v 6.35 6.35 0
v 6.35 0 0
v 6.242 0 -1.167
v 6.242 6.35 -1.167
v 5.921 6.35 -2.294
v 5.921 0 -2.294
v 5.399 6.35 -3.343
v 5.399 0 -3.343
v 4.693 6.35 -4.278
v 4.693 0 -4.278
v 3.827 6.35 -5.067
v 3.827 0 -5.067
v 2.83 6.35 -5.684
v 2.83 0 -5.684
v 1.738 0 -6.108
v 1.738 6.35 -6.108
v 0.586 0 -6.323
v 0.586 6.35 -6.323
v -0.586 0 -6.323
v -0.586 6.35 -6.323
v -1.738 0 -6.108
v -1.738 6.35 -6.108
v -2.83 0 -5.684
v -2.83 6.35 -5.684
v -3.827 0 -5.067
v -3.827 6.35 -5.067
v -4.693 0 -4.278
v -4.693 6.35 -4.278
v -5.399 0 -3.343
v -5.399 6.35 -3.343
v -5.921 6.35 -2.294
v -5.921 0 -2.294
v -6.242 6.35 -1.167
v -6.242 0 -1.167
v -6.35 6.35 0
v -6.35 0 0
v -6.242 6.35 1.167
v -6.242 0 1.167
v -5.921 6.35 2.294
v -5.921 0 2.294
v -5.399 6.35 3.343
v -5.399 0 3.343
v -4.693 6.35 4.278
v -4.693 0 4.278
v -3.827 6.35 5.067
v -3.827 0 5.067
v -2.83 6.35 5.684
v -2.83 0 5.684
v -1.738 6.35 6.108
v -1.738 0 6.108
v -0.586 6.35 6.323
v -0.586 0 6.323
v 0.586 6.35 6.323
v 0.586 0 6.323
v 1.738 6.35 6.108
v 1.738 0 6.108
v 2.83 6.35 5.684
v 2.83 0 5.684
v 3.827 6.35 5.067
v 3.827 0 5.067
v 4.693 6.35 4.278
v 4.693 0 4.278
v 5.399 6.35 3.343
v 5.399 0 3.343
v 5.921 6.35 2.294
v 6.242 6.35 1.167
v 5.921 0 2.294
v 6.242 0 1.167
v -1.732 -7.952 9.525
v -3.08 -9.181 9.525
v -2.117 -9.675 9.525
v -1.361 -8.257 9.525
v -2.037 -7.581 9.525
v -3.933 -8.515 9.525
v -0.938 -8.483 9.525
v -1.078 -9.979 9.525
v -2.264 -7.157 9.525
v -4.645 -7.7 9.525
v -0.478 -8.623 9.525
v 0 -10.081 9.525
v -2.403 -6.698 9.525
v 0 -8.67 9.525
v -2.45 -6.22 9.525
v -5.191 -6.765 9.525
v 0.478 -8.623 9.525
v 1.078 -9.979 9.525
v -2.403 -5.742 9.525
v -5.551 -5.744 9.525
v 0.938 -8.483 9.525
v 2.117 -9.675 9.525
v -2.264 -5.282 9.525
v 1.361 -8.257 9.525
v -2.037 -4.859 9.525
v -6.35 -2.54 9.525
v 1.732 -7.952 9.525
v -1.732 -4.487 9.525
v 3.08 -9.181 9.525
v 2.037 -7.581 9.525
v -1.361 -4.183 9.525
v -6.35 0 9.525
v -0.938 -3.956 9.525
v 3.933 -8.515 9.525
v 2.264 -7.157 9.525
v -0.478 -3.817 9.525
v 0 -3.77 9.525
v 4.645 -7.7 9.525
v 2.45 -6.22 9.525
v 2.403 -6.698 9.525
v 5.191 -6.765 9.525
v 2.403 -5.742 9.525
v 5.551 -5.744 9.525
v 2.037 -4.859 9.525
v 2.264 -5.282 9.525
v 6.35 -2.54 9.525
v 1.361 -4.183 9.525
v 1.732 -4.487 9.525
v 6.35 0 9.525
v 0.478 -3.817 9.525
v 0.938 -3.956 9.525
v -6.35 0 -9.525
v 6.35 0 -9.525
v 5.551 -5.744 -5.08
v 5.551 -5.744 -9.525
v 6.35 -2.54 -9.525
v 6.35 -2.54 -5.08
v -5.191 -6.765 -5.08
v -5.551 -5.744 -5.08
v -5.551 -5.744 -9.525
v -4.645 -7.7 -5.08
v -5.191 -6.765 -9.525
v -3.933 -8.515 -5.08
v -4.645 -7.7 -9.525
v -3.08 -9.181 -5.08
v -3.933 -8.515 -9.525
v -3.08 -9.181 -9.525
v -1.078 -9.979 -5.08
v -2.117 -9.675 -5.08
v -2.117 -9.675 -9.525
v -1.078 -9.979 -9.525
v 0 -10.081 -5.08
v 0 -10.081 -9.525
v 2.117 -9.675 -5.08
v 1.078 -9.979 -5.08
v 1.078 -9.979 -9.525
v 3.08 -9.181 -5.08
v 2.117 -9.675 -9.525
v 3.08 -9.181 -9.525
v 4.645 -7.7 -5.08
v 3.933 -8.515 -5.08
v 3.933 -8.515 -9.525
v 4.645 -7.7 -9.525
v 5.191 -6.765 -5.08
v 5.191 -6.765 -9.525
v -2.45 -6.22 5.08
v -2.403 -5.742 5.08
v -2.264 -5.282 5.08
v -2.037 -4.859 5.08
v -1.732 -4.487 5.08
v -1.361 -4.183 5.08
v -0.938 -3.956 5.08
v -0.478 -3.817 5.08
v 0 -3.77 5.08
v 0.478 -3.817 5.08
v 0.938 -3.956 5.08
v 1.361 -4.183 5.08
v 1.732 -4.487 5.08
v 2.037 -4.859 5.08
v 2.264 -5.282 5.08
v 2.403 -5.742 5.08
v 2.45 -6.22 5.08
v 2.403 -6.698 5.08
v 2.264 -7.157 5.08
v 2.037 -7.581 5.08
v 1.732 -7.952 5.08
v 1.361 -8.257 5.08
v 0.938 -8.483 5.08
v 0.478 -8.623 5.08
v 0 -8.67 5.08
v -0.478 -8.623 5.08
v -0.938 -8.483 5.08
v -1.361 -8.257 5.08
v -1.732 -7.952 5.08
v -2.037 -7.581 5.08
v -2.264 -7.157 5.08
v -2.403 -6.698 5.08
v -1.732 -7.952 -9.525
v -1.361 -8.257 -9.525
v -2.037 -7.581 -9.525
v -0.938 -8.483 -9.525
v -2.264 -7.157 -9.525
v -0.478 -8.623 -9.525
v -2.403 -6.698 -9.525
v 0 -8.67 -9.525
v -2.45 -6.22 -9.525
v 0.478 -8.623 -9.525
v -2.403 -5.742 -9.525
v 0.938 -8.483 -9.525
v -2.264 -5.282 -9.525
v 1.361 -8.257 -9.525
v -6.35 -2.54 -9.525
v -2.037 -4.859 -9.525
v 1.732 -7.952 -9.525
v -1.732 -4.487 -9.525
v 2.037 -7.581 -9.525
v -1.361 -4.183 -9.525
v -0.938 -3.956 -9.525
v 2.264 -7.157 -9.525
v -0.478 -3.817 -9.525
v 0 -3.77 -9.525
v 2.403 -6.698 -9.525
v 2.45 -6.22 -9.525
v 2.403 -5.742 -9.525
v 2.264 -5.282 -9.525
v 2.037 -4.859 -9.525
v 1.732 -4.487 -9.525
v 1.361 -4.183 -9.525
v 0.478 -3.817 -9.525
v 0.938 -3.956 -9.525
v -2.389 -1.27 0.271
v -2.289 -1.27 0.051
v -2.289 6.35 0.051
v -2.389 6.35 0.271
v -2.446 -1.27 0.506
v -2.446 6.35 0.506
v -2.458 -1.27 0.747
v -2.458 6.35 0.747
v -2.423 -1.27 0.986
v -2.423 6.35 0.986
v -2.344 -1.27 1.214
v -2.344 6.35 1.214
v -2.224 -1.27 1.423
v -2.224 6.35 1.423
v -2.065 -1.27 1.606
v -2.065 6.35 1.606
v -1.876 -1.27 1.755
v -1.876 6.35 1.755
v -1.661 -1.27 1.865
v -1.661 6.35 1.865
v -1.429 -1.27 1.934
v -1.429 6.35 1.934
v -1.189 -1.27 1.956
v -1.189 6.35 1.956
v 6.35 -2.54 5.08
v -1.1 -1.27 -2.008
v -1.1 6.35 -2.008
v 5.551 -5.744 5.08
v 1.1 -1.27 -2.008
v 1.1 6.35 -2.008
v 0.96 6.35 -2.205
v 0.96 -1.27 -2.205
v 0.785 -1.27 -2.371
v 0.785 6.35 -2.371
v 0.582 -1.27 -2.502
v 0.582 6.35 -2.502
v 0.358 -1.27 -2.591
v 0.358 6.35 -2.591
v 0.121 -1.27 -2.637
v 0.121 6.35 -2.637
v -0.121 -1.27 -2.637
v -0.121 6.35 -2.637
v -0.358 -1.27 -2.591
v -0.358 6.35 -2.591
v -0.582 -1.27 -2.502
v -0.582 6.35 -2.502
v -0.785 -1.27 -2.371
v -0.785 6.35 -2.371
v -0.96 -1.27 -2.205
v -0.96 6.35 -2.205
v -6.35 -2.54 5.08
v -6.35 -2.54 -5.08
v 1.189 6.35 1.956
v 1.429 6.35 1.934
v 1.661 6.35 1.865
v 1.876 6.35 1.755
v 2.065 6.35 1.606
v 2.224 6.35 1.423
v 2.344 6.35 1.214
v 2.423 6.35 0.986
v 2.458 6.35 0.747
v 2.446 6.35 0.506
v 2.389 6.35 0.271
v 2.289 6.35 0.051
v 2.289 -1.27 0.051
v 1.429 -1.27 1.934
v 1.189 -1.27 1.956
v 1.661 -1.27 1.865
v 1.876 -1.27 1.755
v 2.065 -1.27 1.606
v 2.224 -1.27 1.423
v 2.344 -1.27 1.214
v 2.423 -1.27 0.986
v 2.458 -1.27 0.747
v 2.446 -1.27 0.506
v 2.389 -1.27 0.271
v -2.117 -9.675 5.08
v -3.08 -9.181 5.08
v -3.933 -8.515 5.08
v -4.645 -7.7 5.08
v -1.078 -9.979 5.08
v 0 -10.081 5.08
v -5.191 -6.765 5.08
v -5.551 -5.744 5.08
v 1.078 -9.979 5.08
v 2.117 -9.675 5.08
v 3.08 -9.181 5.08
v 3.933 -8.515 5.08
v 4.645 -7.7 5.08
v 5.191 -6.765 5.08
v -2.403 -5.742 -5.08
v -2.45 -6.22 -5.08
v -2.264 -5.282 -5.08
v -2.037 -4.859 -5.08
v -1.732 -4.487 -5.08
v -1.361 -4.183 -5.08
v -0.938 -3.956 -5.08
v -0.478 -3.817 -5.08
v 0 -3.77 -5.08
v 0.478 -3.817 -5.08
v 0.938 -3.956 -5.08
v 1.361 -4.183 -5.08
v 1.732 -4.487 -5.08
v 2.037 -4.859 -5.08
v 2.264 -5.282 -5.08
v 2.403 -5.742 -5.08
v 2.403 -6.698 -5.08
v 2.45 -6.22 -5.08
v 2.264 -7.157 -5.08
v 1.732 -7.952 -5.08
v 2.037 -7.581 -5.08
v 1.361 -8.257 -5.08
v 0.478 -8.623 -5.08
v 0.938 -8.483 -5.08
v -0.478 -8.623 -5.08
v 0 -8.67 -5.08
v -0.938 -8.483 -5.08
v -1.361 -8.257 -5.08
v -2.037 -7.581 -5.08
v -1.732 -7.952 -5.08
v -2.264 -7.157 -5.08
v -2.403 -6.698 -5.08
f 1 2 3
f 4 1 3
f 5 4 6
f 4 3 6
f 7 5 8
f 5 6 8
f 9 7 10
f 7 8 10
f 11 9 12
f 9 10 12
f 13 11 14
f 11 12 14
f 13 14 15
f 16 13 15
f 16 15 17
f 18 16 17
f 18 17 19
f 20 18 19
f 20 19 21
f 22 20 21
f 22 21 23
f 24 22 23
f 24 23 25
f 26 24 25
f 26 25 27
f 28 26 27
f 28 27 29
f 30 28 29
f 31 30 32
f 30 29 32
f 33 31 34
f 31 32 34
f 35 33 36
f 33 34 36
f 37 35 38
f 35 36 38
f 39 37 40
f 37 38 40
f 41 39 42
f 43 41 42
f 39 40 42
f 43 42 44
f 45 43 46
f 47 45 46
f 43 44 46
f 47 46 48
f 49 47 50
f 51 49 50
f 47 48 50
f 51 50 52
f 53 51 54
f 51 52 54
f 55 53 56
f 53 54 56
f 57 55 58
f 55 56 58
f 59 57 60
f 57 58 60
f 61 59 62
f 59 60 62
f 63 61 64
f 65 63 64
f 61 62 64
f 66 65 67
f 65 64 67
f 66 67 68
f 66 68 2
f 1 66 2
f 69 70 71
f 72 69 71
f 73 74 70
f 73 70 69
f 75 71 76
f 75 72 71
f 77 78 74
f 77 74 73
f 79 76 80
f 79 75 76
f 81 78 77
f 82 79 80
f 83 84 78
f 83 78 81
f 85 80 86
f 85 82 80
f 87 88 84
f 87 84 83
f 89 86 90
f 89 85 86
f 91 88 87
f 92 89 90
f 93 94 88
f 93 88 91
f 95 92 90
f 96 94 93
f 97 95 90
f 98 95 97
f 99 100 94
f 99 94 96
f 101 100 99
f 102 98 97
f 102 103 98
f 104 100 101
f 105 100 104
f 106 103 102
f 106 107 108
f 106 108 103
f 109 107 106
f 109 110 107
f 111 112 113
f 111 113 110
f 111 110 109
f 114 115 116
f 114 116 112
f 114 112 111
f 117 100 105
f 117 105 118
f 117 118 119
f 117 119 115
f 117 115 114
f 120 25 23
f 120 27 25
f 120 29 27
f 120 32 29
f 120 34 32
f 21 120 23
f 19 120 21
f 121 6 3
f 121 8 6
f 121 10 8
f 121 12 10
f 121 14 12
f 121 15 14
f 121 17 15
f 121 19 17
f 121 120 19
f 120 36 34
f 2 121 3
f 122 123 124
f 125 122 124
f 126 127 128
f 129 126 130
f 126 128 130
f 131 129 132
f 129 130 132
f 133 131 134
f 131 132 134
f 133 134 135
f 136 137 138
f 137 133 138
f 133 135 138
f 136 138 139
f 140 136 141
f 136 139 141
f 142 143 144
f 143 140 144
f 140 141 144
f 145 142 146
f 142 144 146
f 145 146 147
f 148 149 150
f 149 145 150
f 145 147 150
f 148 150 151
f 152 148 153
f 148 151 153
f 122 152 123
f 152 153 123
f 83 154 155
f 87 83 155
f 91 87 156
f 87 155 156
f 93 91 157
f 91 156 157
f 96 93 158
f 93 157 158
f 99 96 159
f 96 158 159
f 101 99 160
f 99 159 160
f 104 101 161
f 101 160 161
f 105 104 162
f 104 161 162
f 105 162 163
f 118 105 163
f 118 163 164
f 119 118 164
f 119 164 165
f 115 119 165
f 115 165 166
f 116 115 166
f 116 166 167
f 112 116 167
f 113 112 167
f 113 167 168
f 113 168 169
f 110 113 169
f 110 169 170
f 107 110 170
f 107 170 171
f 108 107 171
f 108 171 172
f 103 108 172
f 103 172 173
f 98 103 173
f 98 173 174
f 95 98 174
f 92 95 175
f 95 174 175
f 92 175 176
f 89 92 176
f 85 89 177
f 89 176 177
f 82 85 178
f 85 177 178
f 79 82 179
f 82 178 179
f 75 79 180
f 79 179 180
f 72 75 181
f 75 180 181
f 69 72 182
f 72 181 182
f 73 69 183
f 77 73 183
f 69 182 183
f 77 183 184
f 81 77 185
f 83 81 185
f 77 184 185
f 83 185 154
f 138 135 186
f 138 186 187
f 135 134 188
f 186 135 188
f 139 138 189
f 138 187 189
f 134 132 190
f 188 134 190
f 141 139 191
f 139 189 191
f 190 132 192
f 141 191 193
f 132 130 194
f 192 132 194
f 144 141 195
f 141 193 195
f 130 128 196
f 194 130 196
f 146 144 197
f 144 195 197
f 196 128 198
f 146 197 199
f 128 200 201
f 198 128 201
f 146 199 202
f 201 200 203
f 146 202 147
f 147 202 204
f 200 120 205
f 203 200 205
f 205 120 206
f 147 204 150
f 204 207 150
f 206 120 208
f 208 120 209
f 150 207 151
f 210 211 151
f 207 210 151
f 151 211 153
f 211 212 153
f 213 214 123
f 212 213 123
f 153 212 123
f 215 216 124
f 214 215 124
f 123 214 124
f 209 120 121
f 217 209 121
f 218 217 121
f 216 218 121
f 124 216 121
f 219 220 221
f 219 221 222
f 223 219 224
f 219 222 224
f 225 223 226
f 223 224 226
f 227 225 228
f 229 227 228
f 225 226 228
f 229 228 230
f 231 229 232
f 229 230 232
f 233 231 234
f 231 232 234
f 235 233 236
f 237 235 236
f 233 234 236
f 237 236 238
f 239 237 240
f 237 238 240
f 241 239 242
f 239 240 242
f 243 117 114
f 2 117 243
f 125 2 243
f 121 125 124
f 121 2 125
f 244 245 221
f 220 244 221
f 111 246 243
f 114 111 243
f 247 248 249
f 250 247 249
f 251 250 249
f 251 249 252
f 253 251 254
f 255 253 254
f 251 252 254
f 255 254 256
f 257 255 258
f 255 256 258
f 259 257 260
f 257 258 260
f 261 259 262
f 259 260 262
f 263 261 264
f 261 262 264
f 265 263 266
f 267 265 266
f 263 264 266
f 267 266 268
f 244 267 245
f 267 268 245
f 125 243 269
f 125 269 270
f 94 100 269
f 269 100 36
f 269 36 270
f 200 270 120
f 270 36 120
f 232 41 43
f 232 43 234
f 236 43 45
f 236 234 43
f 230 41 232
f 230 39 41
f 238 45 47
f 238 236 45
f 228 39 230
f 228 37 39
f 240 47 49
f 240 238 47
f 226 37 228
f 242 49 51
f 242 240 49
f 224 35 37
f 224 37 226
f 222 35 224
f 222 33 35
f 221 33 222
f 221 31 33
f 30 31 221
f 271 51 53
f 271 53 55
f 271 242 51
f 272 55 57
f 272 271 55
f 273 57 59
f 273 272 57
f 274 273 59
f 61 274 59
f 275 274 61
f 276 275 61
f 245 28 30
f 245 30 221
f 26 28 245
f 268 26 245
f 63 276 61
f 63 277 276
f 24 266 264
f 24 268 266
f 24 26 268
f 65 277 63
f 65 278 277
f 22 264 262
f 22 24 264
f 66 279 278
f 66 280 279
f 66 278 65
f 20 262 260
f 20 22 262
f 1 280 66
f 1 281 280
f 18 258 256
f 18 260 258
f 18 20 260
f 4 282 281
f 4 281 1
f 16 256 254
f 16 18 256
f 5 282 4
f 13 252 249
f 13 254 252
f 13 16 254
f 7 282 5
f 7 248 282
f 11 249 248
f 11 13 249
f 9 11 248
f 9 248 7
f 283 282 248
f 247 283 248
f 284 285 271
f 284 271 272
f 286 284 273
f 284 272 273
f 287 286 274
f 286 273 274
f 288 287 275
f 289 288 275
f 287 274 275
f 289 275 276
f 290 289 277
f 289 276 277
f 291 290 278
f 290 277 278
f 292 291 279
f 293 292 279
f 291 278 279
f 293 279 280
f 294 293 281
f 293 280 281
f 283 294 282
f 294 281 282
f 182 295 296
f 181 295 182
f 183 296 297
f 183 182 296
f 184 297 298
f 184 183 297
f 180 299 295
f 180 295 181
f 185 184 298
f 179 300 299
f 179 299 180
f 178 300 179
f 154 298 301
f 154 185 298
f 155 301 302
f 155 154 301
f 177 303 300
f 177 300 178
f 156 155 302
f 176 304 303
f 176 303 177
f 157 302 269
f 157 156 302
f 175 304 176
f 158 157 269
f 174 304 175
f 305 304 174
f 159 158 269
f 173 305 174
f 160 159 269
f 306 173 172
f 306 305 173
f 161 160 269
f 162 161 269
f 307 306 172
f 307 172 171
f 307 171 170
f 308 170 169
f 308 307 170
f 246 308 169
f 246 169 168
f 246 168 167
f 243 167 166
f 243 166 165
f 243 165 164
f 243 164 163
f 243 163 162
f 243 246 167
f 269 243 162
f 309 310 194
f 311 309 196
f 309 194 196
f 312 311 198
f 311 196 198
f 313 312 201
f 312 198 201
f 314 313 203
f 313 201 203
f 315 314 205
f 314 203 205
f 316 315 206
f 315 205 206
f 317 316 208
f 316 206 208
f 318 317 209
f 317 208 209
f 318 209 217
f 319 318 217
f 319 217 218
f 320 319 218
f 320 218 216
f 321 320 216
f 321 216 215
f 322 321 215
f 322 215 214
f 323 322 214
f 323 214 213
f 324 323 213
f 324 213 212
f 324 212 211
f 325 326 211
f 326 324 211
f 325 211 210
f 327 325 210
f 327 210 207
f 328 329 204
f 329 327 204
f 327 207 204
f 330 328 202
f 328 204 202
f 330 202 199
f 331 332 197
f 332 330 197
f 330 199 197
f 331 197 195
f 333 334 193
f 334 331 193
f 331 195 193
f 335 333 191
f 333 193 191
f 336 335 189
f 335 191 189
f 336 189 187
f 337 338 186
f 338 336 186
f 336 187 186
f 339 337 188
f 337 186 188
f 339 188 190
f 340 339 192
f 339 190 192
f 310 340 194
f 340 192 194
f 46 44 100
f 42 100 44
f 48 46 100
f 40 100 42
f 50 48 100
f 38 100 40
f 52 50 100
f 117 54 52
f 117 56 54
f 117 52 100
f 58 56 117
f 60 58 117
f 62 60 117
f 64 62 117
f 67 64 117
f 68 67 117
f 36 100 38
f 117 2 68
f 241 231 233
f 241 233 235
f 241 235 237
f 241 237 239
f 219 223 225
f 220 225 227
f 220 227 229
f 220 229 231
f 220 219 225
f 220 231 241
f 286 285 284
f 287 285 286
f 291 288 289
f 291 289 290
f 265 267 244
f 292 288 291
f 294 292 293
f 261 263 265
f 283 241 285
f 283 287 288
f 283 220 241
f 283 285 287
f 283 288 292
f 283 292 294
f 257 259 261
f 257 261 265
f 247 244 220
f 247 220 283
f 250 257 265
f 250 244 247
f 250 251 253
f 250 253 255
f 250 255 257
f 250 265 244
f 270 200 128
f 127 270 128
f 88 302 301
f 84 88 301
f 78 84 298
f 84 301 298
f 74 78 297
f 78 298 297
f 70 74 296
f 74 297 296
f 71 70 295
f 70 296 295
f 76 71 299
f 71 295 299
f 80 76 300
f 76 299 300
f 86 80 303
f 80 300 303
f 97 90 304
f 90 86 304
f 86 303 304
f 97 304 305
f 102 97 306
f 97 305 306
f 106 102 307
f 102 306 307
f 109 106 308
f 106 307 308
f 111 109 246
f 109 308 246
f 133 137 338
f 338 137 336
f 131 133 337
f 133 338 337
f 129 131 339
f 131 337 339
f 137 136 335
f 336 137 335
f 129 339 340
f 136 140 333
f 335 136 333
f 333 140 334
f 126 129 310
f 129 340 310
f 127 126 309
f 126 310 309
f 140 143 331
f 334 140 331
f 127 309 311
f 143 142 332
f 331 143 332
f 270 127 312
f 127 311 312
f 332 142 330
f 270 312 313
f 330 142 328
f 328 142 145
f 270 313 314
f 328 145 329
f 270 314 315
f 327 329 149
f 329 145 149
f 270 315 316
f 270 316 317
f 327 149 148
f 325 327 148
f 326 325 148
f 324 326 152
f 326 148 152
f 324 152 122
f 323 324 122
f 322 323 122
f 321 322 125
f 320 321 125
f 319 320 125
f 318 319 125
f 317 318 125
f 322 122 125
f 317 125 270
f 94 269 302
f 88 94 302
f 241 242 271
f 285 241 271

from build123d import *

# Parameters (mm, degrees)
SKETCH1_R               = 6.35
BOSS_EXTRUDE1_DEPTH     = 6.35
SKETCH1_5_W             = 12.7
SKETCH1_5_H             = 19.05
BOSS_EXTRUDE3_DEPTH     = 10.16
CUT_EXTRUDE1_DEPTH      = 7.62
CUT_EXTRUDE3_DEPTH      = 1
CUT_EXTRUDE3_DEPTH_BACK = 20.05
SKETCH5_4_R             = 2.4500078
CUT_EXTRUDE4_DEPTH      = 20.05
SKETCH6_W               = 10.16
SKETCH6_H               = 12.113180789
CUT_EXTRUDE5_DEPTH      = 7.35
CUT_EXTRUDE5_DEPTH_BACK = 7.35


with BuildPart() as part:
    # Sketch1 → Boss-Extrude1 (new body)
    with BuildSketch(Plane(origin=(0, 0, 0), x_dir=(1, 0, 0), z_dir=(0, 1, 0))):
        Circle(SKETCH1_R)
    extrude(amount=BOSS_EXTRUDE1_DEPTH)

    # Sketch1<5> → Boss-Extrude3 (add)
    with BuildSketch(Plane(origin=(0, 0, 0), x_dir=(1, 0, 0), z_dir=(0, 1, 0))):
        Rectangle(SKETCH1_5_W, SKETCH1_5_H)
    extrude(amount=-BOSS_EXTRUDE3_DEPTH)

    # Sketch3 → Cut-Extrude1 (cut)
    with BuildSketch(Plane(origin=(0, 6.35, 0), x_dir=(1, 0, 0), z_dir=(0, 1, 0))):
        with BuildLine():
            Line((-1.099852263, 2.007933515), (-2.288847564, -0.051466757))
            ThreePointArc((-2.288847564, -0.051466757), (-2.288847564, -1.321466757), (-1.188995301, -1.956466757))
            Line((-1.188995301, -1.956466757), (1.188995301, -1.956466757))
            ThreePointArc((1.188995301, -1.956466757), (2.288847564, -1.321466757), (2.288847564, -0.051466757))
            Line((2.288847564, -0.051466757), (1.099852263, 2.007933515))
            ThreePointArc((1.099852263, 2.007933515), (0, 2.642933515), (-1.099852263, 2.007933515))
        make_face()
    extrude(amount=-CUT_EXTRUDE1_DEPTH, mode=Mode.SUBTRACT)

    # Sketch5 → Cut-Extrude3 (cut, two sides)
    with BuildSketch(Plane(origin=(0, 0, -9.525), x_dir=(-1, 0, 0), z_dir=(0, 0, -1))) as cut_extrude3_sk:
        with BuildLine():
            Line((6.35, -2.54), (5.551173901, -5.743916488))
            ThreePointArc((5.551173901, -5.743916488), (0, -10.080968867), (-5.551173901, -5.743916488))
            Line((-5.551173901, -5.743916488), (-6.35, -2.54))
            Line((-6.35, -2.54), (-6.35, -10.16))
            Line((-6.35, -10.16), (6.35, -10.16))
            Line((6.35, -10.16), (6.35, -2.54))
        make_face()
    extrude(amount=CUT_EXTRUDE3_DEPTH, mode=Mode.SUBTRACT)
    extrude(cut_extrude3_sk.sketch, amount=-CUT_EXTRUDE3_DEPTH_BACK, mode=Mode.SUBTRACT)

    # Sketch5<4> → Cut-Extrude4 (cut, through all)
    with BuildSketch(Plane(origin=(0, 0, -9.525), x_dir=(-1, 0, 0), z_dir=(0, 0, -1))):
        with Locations((0, -6.219754937)):
            Circle(SKETCH5_4_R)
    extrude(amount=-CUT_EXTRUDE4_DEPTH, mode=Mode.SUBTRACT)

    # Sketch6 → Cut-Extrude5 (cut, two sides)
    with BuildSketch(Plane(origin=(0, 0, 0), x_dir=(0, 0, -1), z_dir=(1, 0, 0))) as cut_extrude5_sk:
        with Locations((0, -8.596590394)):
            Rectangle(SKETCH6_W, SKETCH6_H)
    extrude(amount=CUT_EXTRUDE5_DEPTH, mode=Mode.SUBTRACT)
    extrude(cut_extrude5_sk.sketch, amount=-CUT_EXTRUDE5_DEPTH_BACK, mode=Mode.SUBTRACT)


solid = part.part
